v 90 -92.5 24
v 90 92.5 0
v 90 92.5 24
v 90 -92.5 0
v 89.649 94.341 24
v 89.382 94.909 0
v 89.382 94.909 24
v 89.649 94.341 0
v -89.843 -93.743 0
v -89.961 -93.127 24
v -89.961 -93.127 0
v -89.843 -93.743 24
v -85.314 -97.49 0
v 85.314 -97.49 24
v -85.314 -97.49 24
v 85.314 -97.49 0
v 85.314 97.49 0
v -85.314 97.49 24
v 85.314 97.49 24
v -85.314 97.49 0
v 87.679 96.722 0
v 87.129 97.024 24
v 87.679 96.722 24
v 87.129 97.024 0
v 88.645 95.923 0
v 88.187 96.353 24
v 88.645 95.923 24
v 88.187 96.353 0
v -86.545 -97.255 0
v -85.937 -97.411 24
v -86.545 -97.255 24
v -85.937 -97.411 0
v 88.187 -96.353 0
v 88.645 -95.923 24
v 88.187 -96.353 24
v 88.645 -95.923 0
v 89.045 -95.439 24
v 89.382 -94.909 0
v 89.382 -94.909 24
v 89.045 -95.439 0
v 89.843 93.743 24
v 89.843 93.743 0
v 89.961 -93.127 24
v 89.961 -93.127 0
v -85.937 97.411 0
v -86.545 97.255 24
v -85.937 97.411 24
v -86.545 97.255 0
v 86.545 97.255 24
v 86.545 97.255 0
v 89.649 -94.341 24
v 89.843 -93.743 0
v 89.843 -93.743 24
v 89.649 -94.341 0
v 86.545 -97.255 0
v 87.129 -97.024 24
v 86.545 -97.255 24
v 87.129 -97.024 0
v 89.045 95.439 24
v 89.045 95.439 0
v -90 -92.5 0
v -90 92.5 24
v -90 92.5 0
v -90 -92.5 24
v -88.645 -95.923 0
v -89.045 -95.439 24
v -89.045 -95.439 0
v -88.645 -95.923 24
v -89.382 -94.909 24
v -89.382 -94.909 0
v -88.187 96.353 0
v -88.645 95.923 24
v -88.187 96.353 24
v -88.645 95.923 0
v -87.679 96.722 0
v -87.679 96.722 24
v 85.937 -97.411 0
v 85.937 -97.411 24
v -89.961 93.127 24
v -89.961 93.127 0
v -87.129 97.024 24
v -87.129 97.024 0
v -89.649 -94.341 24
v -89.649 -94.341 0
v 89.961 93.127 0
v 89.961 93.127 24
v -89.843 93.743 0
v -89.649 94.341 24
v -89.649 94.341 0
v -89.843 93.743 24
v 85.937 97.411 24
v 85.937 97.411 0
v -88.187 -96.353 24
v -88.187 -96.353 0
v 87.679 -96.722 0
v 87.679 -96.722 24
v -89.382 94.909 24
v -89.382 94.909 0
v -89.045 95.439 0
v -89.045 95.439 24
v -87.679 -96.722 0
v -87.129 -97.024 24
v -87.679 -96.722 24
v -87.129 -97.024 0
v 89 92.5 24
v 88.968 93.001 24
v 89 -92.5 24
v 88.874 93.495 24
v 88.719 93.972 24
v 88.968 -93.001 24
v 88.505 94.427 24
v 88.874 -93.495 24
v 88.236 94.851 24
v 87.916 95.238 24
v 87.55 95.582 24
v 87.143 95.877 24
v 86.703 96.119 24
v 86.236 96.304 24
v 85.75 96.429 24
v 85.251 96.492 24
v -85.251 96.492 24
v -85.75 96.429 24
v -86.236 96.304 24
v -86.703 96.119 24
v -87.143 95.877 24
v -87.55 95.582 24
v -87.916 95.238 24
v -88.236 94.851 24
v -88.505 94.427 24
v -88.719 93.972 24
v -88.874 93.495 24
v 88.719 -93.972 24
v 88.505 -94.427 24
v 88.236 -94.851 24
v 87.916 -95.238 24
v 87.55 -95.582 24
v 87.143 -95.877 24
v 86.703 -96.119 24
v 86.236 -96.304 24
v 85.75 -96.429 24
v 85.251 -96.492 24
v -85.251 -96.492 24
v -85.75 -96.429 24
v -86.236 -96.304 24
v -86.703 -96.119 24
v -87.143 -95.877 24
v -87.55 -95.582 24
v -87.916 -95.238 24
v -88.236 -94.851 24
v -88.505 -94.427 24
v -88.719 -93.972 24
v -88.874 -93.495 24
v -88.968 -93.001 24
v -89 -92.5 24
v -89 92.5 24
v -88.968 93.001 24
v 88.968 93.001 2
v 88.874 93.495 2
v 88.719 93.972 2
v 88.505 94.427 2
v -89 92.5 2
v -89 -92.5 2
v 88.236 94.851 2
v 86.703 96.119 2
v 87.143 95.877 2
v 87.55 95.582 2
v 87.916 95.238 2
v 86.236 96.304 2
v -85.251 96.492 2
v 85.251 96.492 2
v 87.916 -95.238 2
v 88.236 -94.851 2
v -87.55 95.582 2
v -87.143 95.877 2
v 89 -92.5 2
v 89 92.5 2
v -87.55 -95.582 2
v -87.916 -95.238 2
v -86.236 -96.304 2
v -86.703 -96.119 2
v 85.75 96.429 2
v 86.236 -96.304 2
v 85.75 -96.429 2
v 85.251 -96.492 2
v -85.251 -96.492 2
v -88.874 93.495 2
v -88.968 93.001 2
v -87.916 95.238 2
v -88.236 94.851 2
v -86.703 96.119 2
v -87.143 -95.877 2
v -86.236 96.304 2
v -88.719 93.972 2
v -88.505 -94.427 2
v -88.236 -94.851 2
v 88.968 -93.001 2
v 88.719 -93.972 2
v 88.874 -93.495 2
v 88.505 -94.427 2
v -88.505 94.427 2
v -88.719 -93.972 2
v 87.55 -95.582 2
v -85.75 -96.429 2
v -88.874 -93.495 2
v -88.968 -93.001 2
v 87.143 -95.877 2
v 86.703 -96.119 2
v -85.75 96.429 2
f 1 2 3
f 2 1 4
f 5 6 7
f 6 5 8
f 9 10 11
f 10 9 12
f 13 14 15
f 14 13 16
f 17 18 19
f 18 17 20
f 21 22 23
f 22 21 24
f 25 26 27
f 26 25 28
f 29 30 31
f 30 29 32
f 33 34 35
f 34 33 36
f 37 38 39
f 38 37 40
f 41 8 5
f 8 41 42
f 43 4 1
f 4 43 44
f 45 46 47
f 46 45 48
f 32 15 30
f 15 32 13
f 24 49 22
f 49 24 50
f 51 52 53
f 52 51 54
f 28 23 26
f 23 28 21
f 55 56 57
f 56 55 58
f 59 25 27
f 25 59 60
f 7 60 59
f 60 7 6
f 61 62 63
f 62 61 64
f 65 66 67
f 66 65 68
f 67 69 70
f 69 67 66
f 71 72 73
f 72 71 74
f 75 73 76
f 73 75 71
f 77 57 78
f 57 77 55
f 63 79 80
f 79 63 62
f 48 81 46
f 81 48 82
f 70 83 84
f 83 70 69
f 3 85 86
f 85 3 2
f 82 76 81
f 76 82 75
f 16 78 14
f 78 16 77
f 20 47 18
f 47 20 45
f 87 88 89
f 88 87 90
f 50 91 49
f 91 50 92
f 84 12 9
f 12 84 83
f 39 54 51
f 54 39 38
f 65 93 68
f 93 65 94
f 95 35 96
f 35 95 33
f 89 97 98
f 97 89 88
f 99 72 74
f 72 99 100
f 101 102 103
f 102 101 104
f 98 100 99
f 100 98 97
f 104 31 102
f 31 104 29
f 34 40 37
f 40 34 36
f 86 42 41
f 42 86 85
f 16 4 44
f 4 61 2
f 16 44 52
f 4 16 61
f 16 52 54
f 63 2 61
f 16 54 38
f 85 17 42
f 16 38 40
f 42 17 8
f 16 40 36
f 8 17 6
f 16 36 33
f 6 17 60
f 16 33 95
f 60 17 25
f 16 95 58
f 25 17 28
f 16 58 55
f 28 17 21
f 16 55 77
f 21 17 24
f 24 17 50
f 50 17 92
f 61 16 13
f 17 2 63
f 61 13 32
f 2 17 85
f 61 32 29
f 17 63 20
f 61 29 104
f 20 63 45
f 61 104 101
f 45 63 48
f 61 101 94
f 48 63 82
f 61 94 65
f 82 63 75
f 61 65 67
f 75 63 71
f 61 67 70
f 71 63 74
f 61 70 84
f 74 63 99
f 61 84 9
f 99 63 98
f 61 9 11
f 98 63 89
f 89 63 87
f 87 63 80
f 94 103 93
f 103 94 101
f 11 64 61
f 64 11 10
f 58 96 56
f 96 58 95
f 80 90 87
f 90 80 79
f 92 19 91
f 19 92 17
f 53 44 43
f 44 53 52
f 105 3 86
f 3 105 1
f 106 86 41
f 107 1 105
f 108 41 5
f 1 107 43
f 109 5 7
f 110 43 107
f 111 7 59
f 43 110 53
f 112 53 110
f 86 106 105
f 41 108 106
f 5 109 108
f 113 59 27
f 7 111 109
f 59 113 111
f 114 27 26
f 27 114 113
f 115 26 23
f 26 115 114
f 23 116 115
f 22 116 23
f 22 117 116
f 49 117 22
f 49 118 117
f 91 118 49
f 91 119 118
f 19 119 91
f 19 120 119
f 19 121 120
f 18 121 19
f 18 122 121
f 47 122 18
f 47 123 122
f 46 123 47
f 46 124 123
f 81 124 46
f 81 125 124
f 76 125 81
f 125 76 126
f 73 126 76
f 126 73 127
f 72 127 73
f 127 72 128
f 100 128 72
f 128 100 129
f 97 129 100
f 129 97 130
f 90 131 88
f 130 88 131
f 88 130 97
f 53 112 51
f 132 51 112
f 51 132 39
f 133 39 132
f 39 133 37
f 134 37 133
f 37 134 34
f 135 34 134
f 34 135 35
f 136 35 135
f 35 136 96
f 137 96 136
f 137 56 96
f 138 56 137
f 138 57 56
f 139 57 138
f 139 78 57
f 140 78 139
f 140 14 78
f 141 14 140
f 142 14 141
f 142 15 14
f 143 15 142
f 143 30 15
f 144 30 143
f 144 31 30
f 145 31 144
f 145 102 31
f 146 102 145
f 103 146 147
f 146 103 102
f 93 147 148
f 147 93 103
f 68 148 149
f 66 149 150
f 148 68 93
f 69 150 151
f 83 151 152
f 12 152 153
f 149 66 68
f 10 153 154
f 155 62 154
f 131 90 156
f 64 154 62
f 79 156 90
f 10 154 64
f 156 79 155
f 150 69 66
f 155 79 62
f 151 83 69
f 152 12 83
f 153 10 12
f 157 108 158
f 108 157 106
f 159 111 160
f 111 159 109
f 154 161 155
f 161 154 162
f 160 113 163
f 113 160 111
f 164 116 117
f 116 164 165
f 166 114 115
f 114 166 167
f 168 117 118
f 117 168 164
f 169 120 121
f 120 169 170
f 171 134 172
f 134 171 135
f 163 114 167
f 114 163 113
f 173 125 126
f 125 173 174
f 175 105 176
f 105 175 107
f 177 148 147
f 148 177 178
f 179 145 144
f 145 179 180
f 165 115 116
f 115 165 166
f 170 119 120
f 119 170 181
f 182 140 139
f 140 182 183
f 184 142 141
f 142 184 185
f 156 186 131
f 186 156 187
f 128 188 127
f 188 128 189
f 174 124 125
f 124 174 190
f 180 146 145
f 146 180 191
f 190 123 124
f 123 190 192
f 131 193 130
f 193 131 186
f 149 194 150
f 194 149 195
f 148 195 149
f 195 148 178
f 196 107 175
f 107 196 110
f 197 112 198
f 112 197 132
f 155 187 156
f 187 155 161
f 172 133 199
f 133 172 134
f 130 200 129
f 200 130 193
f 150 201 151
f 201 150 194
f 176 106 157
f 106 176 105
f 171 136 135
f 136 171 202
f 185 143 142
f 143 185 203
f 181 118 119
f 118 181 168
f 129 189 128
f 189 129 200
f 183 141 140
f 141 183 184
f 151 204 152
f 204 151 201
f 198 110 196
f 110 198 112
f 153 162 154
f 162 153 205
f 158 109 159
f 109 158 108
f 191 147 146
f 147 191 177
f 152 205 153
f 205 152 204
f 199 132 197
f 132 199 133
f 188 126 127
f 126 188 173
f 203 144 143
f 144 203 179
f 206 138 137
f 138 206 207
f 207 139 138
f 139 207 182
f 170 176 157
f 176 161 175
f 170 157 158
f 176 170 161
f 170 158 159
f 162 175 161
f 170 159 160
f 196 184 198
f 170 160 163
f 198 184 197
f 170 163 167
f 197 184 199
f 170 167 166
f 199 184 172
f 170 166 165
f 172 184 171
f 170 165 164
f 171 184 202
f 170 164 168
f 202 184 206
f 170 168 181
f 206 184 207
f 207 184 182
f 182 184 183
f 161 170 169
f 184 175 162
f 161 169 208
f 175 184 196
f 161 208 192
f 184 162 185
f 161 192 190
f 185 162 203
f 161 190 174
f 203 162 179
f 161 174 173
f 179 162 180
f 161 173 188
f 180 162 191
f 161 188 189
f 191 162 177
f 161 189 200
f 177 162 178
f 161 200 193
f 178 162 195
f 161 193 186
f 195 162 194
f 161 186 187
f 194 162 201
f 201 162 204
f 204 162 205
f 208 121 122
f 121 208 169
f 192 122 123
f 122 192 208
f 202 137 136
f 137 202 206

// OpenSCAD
$fn = 50;


difference() {
	union() {
		hull() {
			translate(v = [-85.0000000000, 92.5000000000, 0]) {
				cylinder(h = 24, r = 5);
			}
			translate(v = [85.0000000000, 92.5000000000, 0]) {
				cylinder(h = 24, r = 5);
			}
			translate(v = [-85.0000000000, -92.5000000000, 0]) {
				cylinder(h = 24, r = 5);
			}
			translate(v = [85.0000000000, -92.5000000000, 0]) {
				cylinder(h = 24, r = 5);
			}
		}
	}
	union() {
		translate(v = [0, 0, 2]) {
			hull() {
				translate(v = [-85.0000000000, 92.5000000000, 0]) {
					cylinder(h = 22, r = 4);
				}
				translate(v = [85.0000000000, 92.5000000000, 0]) {
					cylinder(h = 22, r = 4);
				}
				translate(v = [-85.0000000000, -92.5000000000, 0]) {
					cylinder(h = 22, r = 4);
				}
				translate(v = [85.0000000000, -92.5000000000, 0]) {
					cylinder(h = 22, r = 4);
				}
			}
		}
	}
}
